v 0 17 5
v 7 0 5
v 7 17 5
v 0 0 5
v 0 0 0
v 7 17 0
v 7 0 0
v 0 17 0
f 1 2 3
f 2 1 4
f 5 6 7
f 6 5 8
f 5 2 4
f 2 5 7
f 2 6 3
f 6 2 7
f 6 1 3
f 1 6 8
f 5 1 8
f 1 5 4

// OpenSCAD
// Generated by SolidPython 1.0.1 on 2020-07-29 00:46:55


cube(size = [7, 17, 5]);
/***********************************************
*********      SolidPython code:      **********
************************************************
 
# import packages: SolidPython
from solid import *
from solid.utils import *
from itertools import chain, combinations, permutations


class Resize:

    def __init__(self, scad_file):
        self.scad_file = scad_file
        #self.scad_file = import_scad(scad_file)
        # cone/cylinder param:
        self.r1 = 0
        self.r2 = 0
        self.h = 0
        # rectangular prism param:
        self.w = 0
        self.l = 0
        # ellipse param:
        self.r = 0

    # import OpenScad code (file name corresponds to shape)


    # classify shape + parameters
    def assign(self, param1, param2, param3):
        if self.scad_file == 'cone.scad':
            self.r1 = param1
            self.r2 = param2
            self.h = param3
        elif self.scad_file == 'cylinder.scad':
            self.r1 = param1
            self.r2 = param2
            self.h = param3
        elif self.scad_file == 'rectangularPrism.scad':
            self.h = param1
            self.l = param2
            self.w = param3
        else:
            self.r = param1
            self.h = param2

    # resize parameters
    def iterate(self):
        x = range(3, 20, 2)
        i = 1
        if self.scad_file == 'cone.scad':
            tempList = list(permutations(x, 2))
            for temp in tempList:
                param1 = temp[0]
                param2 = temp[1]
                filepath = 'produced_scad_files/' + 'cone' + str(param1) + '_' + str(param2) + '_' + '.scad'
                scad_render_to_file(cylinder(h=param1, r1=param2, r2=0), filepath)

        elif self.scad_file == 'cylinder.scad':
            tempList = list(permutations(x, 3))
            for temp in tempList:
                param1 = temp[0]
                param2 = temp[1]
                filepath = 'produced_scad_files/' + 'cylinder' + str(param1) + '_' + str(param2) + '_' + '.scad'
                scad_render_to_file(cylinder(h=param1, r1=param2, r2=param2), filepath)

        elif self.scad_file == 'rectangularPrism.scad':
            tempList = list(permutations(x, 3))
            for temp in tempList:
                param1 = temp[0]
                param2 = temp[1]
                param3 = temp[2]
                filepath = 'produced_scad_files/' + 'rectangularPrism' + str(param1) + '_' + str(param2) + '_' + str(
                    param3) + '.scad'
                scad_render_to_file(cube(size=(param1, param2, param3)), filepath)

        elif self.scad_file == 'ellipse.scad':
            tempList = list(permutations(x, 4))
            for temp in tempList:
                param1 = temp[0]
                param2 = temp[1]
                param3 = temp[2]
                param4 = temp[3]
                filepath = 'produced_scad_files/' + 'ellipse' + str(param1) + '_' + str(param2) + '_' + str(param3) + '_' + str(param4) + '.scad'
                scad_render_to_file(scale([param1, param2, param3])(sphere(r=param4)), filepath)

    def render_to_scadfile(self):
        scad_render_to_file(scad, 'example.scad') 
 
************************************************/
